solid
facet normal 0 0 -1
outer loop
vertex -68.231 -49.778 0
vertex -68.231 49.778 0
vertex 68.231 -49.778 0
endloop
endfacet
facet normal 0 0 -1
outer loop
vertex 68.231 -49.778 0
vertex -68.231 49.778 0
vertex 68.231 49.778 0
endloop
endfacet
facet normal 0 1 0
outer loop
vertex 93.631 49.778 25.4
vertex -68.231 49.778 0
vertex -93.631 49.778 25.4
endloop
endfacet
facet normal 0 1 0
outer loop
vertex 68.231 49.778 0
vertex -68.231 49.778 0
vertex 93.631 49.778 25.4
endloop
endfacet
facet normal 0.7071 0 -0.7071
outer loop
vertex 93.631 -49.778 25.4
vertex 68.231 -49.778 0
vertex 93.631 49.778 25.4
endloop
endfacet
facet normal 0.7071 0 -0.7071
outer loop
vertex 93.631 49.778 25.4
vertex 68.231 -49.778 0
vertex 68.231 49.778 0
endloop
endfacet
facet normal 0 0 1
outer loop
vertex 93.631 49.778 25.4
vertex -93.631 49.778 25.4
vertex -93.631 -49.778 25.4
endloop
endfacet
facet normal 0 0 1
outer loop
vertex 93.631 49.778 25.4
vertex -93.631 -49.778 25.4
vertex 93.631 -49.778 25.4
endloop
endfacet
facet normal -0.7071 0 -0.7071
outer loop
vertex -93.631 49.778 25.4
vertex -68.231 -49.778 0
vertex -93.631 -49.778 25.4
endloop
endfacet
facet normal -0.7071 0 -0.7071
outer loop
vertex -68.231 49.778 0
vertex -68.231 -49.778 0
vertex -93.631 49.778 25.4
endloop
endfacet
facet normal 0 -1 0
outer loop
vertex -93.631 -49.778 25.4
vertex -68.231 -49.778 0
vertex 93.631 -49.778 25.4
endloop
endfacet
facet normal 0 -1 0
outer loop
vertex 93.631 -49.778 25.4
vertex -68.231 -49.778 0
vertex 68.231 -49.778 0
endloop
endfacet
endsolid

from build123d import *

# Parameters (mm, degrees)
F0_W     = 187.2611194849
F0_H     = 99.5552539825
F1_DEPTH = 25.4
F2_SIZE  = 25.39999


# Not quite as in the source:
# - a fillet or chamfer is up to 0.001 mm smaller than in the source, because OpenCascade refuses the exact size


with BuildPart() as f1:
    # F0 (on Top) → F1 (new body)
    with BuildSketch(Plane.XY):
        Rectangle(F0_W, F0_H)
    extrude(amount=F1_DEPTH)

    # F2 (size 25.4 in the source; OpenCascade refuses exactly that, so slightly less here)
    f2_edges = [f1.edges().sort_by_distance(p)[0] for p in [
        (-93.63056, 0, 0),
        (93.63056, 0, 0),
    ]]
    chamfer(f2_edges, length=F2_SIZE)


solid = f1.part
